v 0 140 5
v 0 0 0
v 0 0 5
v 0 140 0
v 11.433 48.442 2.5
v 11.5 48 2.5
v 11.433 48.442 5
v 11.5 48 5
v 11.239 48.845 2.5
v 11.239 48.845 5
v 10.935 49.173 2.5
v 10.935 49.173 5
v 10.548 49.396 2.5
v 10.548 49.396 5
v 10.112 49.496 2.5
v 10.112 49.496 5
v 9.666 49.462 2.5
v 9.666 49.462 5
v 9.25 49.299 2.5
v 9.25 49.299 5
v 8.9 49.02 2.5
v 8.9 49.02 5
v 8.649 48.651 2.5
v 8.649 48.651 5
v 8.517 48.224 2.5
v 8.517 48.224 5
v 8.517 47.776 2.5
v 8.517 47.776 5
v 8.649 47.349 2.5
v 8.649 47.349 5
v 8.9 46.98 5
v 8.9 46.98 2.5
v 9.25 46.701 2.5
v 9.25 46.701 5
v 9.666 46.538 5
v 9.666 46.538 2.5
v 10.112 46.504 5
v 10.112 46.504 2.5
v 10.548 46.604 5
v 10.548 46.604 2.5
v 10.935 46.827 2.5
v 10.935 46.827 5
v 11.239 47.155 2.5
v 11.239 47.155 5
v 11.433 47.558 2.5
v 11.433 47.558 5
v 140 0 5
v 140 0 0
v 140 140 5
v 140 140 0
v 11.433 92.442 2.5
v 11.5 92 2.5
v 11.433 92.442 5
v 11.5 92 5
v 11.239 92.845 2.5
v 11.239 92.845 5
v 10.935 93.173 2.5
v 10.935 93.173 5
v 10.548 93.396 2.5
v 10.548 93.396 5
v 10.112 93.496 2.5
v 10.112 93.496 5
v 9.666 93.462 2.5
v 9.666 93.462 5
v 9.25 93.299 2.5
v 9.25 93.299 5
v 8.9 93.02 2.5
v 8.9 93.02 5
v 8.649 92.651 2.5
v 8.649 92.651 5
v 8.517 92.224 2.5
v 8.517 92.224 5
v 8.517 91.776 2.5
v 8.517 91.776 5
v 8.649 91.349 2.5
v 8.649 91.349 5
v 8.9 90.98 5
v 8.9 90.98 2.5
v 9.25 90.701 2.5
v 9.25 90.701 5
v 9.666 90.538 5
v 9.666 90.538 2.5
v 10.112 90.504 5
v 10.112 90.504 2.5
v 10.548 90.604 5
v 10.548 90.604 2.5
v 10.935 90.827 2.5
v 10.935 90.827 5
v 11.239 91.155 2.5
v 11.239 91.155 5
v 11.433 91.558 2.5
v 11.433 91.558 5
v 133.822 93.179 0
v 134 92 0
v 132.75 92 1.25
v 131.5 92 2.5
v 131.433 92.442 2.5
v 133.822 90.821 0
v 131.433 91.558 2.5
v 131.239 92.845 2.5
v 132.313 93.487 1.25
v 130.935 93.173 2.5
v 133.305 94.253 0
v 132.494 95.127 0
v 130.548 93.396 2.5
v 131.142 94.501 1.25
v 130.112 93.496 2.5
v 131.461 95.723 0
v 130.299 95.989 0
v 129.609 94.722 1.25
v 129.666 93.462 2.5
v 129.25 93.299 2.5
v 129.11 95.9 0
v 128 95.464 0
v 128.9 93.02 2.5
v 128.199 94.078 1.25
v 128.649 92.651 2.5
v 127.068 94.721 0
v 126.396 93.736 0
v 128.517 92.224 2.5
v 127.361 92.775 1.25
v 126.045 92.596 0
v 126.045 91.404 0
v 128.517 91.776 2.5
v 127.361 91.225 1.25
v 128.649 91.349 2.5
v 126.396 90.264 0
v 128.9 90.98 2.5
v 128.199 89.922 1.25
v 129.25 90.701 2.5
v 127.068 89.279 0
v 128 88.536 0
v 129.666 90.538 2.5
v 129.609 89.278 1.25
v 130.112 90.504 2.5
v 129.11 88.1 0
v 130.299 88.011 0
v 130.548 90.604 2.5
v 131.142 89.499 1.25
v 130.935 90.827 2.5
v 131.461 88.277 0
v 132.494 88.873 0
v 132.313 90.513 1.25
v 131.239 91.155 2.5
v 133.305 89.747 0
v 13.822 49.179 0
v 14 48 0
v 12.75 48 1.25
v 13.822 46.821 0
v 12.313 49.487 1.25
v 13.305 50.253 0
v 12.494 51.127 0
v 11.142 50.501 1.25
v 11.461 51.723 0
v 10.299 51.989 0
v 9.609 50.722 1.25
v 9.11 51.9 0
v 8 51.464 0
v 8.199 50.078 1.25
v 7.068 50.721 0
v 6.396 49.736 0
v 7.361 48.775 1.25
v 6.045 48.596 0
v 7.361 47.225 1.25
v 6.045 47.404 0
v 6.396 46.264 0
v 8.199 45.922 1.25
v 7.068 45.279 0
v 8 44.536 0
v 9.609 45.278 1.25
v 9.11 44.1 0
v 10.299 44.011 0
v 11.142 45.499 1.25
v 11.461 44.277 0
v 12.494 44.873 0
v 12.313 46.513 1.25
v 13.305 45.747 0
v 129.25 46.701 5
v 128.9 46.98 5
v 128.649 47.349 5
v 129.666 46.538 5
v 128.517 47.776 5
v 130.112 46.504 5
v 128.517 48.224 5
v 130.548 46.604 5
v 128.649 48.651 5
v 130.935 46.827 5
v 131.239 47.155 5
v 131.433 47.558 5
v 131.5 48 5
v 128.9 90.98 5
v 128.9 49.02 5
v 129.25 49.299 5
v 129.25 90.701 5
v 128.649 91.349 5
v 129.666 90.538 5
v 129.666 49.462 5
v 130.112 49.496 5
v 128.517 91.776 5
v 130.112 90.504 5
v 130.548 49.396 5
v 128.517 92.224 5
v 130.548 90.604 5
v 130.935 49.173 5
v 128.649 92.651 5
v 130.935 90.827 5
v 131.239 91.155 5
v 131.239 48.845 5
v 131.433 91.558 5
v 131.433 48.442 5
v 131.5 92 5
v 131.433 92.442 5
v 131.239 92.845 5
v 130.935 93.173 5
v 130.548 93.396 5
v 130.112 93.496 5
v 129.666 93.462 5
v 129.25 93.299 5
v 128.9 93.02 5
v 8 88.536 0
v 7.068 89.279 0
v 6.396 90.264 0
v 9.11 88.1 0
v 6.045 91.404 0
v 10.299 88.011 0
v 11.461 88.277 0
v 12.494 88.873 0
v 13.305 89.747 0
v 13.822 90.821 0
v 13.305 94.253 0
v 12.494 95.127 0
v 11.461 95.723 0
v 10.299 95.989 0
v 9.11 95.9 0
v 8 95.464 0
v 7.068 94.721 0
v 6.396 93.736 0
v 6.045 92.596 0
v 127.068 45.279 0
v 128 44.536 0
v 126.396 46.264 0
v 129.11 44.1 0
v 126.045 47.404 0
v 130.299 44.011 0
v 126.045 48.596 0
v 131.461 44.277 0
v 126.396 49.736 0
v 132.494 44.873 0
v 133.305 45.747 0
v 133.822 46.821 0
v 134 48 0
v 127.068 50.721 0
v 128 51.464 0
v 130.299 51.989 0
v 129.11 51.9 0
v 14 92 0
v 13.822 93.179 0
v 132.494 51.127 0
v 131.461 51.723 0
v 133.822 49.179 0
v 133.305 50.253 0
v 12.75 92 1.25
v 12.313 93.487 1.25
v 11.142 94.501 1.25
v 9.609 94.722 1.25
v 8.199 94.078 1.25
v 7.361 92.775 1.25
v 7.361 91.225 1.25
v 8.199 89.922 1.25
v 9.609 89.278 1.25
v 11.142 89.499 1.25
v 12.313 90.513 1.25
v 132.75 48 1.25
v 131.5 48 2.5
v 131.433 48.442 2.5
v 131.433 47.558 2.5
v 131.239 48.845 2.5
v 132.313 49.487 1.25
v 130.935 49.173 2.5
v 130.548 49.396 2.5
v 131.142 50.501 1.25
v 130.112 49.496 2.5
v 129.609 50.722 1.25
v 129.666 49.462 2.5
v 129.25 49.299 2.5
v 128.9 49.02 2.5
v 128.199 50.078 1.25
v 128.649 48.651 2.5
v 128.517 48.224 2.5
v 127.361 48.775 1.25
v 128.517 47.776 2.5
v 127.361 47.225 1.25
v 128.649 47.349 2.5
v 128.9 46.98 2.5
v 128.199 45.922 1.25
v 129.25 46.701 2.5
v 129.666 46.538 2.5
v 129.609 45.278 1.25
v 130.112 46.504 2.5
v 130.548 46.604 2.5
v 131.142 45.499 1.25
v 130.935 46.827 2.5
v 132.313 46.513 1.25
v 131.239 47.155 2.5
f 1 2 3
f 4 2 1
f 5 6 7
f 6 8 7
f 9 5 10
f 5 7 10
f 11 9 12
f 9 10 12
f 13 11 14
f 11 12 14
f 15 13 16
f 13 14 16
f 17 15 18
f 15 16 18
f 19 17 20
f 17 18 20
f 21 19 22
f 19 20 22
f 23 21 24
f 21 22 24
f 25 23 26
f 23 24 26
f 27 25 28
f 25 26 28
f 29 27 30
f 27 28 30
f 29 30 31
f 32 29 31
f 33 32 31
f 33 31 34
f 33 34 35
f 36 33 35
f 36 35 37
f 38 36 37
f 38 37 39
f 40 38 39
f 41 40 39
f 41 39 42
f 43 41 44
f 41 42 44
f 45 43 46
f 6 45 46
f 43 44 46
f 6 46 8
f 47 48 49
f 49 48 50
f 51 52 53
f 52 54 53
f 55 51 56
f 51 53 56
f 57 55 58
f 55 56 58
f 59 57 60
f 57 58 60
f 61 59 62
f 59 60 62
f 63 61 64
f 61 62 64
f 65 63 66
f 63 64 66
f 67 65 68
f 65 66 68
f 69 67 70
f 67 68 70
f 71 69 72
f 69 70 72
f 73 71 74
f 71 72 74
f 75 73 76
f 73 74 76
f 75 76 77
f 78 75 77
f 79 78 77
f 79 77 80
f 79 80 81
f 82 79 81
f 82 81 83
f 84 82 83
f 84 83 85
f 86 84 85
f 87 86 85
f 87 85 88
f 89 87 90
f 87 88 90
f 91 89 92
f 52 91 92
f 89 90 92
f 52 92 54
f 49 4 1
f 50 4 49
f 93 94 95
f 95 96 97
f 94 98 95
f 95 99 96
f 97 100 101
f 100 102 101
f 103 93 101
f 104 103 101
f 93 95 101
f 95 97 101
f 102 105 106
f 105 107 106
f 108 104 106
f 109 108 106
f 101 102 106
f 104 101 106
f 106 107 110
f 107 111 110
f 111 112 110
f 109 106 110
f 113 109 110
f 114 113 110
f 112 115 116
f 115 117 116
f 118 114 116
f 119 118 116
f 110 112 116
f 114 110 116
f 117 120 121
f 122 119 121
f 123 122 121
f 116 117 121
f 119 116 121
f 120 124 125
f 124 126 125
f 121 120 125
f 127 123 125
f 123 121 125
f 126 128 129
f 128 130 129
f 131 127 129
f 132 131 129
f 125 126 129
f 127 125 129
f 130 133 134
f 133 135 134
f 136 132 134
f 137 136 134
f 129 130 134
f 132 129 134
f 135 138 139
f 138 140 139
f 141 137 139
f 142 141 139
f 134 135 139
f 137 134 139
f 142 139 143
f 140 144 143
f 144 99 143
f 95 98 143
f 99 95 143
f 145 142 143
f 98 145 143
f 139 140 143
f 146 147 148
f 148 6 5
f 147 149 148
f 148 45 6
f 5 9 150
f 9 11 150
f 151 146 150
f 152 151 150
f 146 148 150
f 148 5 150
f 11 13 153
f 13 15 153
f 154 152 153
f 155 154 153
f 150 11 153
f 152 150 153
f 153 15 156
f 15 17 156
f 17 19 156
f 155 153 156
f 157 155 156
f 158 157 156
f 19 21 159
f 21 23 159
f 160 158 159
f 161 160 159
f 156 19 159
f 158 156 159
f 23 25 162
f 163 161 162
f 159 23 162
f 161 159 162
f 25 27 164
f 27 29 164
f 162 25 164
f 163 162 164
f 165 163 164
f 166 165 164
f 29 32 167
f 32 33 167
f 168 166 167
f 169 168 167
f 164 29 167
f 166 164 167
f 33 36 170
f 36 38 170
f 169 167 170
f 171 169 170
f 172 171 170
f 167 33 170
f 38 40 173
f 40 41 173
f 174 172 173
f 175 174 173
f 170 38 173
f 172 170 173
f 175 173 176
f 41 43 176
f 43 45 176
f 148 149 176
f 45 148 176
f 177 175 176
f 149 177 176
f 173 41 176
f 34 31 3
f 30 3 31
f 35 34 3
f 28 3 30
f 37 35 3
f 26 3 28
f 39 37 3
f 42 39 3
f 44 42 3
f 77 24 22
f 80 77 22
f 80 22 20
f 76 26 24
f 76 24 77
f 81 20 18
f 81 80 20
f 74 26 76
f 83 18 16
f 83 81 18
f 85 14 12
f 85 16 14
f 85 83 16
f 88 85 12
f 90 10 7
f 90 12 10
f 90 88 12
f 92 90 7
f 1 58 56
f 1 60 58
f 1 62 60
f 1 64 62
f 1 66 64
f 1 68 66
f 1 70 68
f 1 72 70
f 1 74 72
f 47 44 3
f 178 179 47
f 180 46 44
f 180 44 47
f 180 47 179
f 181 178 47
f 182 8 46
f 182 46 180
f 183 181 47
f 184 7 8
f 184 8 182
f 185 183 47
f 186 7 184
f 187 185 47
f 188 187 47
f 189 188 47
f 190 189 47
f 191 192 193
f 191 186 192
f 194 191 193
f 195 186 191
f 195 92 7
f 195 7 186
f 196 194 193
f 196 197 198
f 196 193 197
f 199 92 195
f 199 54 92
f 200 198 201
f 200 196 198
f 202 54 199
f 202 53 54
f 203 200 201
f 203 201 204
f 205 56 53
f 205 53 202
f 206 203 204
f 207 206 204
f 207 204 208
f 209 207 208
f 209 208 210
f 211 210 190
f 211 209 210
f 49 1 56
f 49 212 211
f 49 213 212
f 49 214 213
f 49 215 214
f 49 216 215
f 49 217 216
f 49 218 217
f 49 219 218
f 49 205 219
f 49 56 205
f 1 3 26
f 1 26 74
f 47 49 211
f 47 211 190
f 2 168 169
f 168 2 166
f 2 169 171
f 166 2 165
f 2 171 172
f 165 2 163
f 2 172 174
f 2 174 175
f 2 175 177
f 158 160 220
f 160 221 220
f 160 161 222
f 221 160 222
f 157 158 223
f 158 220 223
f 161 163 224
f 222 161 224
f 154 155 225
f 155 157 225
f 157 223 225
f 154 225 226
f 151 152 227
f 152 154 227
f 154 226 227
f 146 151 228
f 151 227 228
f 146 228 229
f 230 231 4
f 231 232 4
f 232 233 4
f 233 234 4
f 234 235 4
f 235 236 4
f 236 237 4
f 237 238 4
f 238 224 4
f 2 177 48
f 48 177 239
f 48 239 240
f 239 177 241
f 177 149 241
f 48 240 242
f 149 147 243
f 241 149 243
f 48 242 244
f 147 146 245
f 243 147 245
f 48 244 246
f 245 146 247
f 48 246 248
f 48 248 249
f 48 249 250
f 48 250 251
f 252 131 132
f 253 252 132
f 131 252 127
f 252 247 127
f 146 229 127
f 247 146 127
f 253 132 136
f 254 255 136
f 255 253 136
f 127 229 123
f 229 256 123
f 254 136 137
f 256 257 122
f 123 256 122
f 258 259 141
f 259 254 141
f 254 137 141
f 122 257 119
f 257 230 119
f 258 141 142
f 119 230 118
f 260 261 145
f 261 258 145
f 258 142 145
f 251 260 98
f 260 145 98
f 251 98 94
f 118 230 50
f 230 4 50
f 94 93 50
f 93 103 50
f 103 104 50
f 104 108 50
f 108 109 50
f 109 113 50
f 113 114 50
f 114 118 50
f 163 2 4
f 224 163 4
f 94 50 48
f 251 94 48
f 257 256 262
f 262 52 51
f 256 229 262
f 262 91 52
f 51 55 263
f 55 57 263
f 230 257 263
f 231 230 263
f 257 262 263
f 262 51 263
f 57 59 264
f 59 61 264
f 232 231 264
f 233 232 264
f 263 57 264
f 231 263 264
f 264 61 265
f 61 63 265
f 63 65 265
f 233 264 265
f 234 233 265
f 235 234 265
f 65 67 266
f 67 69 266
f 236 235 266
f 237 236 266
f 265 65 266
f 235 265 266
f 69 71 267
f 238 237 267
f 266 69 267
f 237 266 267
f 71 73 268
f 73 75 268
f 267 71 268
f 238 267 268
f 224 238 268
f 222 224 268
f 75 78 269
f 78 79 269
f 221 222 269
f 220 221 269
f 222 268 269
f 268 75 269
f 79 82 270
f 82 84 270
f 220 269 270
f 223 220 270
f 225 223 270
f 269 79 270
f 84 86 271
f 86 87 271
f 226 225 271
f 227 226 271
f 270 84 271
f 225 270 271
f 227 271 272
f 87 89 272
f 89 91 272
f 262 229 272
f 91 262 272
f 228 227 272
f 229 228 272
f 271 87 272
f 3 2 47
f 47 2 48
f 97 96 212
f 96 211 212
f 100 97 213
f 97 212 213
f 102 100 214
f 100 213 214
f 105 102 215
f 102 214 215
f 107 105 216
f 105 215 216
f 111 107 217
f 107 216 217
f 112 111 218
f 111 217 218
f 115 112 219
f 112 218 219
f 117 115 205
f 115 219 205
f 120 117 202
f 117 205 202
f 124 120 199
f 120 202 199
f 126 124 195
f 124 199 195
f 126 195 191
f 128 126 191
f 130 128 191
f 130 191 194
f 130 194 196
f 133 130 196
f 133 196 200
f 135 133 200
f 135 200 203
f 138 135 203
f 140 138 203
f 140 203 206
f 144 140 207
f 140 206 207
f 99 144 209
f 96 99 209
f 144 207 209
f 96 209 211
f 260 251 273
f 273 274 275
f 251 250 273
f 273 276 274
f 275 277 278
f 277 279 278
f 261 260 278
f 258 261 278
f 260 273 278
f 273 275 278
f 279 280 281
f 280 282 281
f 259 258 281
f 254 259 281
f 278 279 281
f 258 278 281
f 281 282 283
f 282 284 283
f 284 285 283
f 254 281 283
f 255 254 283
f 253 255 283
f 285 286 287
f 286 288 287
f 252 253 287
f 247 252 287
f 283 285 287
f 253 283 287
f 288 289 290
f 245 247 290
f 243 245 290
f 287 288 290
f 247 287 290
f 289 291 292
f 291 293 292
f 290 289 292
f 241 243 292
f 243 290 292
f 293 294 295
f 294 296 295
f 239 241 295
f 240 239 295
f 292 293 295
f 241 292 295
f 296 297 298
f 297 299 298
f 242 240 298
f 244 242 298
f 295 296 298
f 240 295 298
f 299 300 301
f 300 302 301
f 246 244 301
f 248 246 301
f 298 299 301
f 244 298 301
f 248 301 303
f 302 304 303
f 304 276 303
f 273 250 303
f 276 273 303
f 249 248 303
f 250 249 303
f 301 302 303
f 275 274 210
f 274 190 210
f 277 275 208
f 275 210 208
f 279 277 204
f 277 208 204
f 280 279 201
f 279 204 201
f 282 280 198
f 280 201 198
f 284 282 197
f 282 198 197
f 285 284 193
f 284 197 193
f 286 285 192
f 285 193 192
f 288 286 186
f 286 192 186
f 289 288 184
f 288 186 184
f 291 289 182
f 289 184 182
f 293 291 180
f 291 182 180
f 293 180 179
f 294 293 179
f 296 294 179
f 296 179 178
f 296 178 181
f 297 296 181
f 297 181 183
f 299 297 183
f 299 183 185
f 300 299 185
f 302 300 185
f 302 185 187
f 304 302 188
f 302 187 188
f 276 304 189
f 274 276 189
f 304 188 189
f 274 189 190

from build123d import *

# Parameters (mm, degrees)
SKETCH1_W                                       = 140
SKETCH1_H                                       = 140
BOSS_EXTRUDE1_DEPTH                             = 5
CSK_FOR_M3_FLAT_HEAD_MACHINE_SCREW1_D           = 3
CSK_FOR_M3_FLAT_HEAD_MACHINE_SCREW1_CSINK_D     = 8
CSK_FOR_M3_FLAT_HEAD_MACHINE_SCREW1_CSINK_ANGLE = 90


with BuildPart() as part:
    # Sketch1 → Boss-Extrude1 (new body)
    with BuildSketch(Plane.XY):
        with Locations((70, 70)):
            Rectangle(SKETCH1_W, SKETCH1_H)
    extrude(amount=BOSS_EXTRUDE1_DEPTH)

    # CSK for M3 Flat Head Machine Screw1 (through all)
    with Locations(Plane(origin=(0, 0, 0), x_dir=(-1, 0, 0), z_dir=(0, 0, -1))):
        with Locations((-130, 92), (-130, 48), (-10, 92), (-10, 48)):
            CounterSinkHole(CSK_FOR_M3_FLAT_HEAD_MACHINE_SCREW1_D / 2, CSK_FOR_M3_FLAT_HEAD_MACHINE_SCREW1_CSINK_D / 2, counter_sink_angle=CSK_FOR_M3_FLAT_HEAD_MACHINE_SCREW1_CSINK_ANGLE)


solid = part.part
